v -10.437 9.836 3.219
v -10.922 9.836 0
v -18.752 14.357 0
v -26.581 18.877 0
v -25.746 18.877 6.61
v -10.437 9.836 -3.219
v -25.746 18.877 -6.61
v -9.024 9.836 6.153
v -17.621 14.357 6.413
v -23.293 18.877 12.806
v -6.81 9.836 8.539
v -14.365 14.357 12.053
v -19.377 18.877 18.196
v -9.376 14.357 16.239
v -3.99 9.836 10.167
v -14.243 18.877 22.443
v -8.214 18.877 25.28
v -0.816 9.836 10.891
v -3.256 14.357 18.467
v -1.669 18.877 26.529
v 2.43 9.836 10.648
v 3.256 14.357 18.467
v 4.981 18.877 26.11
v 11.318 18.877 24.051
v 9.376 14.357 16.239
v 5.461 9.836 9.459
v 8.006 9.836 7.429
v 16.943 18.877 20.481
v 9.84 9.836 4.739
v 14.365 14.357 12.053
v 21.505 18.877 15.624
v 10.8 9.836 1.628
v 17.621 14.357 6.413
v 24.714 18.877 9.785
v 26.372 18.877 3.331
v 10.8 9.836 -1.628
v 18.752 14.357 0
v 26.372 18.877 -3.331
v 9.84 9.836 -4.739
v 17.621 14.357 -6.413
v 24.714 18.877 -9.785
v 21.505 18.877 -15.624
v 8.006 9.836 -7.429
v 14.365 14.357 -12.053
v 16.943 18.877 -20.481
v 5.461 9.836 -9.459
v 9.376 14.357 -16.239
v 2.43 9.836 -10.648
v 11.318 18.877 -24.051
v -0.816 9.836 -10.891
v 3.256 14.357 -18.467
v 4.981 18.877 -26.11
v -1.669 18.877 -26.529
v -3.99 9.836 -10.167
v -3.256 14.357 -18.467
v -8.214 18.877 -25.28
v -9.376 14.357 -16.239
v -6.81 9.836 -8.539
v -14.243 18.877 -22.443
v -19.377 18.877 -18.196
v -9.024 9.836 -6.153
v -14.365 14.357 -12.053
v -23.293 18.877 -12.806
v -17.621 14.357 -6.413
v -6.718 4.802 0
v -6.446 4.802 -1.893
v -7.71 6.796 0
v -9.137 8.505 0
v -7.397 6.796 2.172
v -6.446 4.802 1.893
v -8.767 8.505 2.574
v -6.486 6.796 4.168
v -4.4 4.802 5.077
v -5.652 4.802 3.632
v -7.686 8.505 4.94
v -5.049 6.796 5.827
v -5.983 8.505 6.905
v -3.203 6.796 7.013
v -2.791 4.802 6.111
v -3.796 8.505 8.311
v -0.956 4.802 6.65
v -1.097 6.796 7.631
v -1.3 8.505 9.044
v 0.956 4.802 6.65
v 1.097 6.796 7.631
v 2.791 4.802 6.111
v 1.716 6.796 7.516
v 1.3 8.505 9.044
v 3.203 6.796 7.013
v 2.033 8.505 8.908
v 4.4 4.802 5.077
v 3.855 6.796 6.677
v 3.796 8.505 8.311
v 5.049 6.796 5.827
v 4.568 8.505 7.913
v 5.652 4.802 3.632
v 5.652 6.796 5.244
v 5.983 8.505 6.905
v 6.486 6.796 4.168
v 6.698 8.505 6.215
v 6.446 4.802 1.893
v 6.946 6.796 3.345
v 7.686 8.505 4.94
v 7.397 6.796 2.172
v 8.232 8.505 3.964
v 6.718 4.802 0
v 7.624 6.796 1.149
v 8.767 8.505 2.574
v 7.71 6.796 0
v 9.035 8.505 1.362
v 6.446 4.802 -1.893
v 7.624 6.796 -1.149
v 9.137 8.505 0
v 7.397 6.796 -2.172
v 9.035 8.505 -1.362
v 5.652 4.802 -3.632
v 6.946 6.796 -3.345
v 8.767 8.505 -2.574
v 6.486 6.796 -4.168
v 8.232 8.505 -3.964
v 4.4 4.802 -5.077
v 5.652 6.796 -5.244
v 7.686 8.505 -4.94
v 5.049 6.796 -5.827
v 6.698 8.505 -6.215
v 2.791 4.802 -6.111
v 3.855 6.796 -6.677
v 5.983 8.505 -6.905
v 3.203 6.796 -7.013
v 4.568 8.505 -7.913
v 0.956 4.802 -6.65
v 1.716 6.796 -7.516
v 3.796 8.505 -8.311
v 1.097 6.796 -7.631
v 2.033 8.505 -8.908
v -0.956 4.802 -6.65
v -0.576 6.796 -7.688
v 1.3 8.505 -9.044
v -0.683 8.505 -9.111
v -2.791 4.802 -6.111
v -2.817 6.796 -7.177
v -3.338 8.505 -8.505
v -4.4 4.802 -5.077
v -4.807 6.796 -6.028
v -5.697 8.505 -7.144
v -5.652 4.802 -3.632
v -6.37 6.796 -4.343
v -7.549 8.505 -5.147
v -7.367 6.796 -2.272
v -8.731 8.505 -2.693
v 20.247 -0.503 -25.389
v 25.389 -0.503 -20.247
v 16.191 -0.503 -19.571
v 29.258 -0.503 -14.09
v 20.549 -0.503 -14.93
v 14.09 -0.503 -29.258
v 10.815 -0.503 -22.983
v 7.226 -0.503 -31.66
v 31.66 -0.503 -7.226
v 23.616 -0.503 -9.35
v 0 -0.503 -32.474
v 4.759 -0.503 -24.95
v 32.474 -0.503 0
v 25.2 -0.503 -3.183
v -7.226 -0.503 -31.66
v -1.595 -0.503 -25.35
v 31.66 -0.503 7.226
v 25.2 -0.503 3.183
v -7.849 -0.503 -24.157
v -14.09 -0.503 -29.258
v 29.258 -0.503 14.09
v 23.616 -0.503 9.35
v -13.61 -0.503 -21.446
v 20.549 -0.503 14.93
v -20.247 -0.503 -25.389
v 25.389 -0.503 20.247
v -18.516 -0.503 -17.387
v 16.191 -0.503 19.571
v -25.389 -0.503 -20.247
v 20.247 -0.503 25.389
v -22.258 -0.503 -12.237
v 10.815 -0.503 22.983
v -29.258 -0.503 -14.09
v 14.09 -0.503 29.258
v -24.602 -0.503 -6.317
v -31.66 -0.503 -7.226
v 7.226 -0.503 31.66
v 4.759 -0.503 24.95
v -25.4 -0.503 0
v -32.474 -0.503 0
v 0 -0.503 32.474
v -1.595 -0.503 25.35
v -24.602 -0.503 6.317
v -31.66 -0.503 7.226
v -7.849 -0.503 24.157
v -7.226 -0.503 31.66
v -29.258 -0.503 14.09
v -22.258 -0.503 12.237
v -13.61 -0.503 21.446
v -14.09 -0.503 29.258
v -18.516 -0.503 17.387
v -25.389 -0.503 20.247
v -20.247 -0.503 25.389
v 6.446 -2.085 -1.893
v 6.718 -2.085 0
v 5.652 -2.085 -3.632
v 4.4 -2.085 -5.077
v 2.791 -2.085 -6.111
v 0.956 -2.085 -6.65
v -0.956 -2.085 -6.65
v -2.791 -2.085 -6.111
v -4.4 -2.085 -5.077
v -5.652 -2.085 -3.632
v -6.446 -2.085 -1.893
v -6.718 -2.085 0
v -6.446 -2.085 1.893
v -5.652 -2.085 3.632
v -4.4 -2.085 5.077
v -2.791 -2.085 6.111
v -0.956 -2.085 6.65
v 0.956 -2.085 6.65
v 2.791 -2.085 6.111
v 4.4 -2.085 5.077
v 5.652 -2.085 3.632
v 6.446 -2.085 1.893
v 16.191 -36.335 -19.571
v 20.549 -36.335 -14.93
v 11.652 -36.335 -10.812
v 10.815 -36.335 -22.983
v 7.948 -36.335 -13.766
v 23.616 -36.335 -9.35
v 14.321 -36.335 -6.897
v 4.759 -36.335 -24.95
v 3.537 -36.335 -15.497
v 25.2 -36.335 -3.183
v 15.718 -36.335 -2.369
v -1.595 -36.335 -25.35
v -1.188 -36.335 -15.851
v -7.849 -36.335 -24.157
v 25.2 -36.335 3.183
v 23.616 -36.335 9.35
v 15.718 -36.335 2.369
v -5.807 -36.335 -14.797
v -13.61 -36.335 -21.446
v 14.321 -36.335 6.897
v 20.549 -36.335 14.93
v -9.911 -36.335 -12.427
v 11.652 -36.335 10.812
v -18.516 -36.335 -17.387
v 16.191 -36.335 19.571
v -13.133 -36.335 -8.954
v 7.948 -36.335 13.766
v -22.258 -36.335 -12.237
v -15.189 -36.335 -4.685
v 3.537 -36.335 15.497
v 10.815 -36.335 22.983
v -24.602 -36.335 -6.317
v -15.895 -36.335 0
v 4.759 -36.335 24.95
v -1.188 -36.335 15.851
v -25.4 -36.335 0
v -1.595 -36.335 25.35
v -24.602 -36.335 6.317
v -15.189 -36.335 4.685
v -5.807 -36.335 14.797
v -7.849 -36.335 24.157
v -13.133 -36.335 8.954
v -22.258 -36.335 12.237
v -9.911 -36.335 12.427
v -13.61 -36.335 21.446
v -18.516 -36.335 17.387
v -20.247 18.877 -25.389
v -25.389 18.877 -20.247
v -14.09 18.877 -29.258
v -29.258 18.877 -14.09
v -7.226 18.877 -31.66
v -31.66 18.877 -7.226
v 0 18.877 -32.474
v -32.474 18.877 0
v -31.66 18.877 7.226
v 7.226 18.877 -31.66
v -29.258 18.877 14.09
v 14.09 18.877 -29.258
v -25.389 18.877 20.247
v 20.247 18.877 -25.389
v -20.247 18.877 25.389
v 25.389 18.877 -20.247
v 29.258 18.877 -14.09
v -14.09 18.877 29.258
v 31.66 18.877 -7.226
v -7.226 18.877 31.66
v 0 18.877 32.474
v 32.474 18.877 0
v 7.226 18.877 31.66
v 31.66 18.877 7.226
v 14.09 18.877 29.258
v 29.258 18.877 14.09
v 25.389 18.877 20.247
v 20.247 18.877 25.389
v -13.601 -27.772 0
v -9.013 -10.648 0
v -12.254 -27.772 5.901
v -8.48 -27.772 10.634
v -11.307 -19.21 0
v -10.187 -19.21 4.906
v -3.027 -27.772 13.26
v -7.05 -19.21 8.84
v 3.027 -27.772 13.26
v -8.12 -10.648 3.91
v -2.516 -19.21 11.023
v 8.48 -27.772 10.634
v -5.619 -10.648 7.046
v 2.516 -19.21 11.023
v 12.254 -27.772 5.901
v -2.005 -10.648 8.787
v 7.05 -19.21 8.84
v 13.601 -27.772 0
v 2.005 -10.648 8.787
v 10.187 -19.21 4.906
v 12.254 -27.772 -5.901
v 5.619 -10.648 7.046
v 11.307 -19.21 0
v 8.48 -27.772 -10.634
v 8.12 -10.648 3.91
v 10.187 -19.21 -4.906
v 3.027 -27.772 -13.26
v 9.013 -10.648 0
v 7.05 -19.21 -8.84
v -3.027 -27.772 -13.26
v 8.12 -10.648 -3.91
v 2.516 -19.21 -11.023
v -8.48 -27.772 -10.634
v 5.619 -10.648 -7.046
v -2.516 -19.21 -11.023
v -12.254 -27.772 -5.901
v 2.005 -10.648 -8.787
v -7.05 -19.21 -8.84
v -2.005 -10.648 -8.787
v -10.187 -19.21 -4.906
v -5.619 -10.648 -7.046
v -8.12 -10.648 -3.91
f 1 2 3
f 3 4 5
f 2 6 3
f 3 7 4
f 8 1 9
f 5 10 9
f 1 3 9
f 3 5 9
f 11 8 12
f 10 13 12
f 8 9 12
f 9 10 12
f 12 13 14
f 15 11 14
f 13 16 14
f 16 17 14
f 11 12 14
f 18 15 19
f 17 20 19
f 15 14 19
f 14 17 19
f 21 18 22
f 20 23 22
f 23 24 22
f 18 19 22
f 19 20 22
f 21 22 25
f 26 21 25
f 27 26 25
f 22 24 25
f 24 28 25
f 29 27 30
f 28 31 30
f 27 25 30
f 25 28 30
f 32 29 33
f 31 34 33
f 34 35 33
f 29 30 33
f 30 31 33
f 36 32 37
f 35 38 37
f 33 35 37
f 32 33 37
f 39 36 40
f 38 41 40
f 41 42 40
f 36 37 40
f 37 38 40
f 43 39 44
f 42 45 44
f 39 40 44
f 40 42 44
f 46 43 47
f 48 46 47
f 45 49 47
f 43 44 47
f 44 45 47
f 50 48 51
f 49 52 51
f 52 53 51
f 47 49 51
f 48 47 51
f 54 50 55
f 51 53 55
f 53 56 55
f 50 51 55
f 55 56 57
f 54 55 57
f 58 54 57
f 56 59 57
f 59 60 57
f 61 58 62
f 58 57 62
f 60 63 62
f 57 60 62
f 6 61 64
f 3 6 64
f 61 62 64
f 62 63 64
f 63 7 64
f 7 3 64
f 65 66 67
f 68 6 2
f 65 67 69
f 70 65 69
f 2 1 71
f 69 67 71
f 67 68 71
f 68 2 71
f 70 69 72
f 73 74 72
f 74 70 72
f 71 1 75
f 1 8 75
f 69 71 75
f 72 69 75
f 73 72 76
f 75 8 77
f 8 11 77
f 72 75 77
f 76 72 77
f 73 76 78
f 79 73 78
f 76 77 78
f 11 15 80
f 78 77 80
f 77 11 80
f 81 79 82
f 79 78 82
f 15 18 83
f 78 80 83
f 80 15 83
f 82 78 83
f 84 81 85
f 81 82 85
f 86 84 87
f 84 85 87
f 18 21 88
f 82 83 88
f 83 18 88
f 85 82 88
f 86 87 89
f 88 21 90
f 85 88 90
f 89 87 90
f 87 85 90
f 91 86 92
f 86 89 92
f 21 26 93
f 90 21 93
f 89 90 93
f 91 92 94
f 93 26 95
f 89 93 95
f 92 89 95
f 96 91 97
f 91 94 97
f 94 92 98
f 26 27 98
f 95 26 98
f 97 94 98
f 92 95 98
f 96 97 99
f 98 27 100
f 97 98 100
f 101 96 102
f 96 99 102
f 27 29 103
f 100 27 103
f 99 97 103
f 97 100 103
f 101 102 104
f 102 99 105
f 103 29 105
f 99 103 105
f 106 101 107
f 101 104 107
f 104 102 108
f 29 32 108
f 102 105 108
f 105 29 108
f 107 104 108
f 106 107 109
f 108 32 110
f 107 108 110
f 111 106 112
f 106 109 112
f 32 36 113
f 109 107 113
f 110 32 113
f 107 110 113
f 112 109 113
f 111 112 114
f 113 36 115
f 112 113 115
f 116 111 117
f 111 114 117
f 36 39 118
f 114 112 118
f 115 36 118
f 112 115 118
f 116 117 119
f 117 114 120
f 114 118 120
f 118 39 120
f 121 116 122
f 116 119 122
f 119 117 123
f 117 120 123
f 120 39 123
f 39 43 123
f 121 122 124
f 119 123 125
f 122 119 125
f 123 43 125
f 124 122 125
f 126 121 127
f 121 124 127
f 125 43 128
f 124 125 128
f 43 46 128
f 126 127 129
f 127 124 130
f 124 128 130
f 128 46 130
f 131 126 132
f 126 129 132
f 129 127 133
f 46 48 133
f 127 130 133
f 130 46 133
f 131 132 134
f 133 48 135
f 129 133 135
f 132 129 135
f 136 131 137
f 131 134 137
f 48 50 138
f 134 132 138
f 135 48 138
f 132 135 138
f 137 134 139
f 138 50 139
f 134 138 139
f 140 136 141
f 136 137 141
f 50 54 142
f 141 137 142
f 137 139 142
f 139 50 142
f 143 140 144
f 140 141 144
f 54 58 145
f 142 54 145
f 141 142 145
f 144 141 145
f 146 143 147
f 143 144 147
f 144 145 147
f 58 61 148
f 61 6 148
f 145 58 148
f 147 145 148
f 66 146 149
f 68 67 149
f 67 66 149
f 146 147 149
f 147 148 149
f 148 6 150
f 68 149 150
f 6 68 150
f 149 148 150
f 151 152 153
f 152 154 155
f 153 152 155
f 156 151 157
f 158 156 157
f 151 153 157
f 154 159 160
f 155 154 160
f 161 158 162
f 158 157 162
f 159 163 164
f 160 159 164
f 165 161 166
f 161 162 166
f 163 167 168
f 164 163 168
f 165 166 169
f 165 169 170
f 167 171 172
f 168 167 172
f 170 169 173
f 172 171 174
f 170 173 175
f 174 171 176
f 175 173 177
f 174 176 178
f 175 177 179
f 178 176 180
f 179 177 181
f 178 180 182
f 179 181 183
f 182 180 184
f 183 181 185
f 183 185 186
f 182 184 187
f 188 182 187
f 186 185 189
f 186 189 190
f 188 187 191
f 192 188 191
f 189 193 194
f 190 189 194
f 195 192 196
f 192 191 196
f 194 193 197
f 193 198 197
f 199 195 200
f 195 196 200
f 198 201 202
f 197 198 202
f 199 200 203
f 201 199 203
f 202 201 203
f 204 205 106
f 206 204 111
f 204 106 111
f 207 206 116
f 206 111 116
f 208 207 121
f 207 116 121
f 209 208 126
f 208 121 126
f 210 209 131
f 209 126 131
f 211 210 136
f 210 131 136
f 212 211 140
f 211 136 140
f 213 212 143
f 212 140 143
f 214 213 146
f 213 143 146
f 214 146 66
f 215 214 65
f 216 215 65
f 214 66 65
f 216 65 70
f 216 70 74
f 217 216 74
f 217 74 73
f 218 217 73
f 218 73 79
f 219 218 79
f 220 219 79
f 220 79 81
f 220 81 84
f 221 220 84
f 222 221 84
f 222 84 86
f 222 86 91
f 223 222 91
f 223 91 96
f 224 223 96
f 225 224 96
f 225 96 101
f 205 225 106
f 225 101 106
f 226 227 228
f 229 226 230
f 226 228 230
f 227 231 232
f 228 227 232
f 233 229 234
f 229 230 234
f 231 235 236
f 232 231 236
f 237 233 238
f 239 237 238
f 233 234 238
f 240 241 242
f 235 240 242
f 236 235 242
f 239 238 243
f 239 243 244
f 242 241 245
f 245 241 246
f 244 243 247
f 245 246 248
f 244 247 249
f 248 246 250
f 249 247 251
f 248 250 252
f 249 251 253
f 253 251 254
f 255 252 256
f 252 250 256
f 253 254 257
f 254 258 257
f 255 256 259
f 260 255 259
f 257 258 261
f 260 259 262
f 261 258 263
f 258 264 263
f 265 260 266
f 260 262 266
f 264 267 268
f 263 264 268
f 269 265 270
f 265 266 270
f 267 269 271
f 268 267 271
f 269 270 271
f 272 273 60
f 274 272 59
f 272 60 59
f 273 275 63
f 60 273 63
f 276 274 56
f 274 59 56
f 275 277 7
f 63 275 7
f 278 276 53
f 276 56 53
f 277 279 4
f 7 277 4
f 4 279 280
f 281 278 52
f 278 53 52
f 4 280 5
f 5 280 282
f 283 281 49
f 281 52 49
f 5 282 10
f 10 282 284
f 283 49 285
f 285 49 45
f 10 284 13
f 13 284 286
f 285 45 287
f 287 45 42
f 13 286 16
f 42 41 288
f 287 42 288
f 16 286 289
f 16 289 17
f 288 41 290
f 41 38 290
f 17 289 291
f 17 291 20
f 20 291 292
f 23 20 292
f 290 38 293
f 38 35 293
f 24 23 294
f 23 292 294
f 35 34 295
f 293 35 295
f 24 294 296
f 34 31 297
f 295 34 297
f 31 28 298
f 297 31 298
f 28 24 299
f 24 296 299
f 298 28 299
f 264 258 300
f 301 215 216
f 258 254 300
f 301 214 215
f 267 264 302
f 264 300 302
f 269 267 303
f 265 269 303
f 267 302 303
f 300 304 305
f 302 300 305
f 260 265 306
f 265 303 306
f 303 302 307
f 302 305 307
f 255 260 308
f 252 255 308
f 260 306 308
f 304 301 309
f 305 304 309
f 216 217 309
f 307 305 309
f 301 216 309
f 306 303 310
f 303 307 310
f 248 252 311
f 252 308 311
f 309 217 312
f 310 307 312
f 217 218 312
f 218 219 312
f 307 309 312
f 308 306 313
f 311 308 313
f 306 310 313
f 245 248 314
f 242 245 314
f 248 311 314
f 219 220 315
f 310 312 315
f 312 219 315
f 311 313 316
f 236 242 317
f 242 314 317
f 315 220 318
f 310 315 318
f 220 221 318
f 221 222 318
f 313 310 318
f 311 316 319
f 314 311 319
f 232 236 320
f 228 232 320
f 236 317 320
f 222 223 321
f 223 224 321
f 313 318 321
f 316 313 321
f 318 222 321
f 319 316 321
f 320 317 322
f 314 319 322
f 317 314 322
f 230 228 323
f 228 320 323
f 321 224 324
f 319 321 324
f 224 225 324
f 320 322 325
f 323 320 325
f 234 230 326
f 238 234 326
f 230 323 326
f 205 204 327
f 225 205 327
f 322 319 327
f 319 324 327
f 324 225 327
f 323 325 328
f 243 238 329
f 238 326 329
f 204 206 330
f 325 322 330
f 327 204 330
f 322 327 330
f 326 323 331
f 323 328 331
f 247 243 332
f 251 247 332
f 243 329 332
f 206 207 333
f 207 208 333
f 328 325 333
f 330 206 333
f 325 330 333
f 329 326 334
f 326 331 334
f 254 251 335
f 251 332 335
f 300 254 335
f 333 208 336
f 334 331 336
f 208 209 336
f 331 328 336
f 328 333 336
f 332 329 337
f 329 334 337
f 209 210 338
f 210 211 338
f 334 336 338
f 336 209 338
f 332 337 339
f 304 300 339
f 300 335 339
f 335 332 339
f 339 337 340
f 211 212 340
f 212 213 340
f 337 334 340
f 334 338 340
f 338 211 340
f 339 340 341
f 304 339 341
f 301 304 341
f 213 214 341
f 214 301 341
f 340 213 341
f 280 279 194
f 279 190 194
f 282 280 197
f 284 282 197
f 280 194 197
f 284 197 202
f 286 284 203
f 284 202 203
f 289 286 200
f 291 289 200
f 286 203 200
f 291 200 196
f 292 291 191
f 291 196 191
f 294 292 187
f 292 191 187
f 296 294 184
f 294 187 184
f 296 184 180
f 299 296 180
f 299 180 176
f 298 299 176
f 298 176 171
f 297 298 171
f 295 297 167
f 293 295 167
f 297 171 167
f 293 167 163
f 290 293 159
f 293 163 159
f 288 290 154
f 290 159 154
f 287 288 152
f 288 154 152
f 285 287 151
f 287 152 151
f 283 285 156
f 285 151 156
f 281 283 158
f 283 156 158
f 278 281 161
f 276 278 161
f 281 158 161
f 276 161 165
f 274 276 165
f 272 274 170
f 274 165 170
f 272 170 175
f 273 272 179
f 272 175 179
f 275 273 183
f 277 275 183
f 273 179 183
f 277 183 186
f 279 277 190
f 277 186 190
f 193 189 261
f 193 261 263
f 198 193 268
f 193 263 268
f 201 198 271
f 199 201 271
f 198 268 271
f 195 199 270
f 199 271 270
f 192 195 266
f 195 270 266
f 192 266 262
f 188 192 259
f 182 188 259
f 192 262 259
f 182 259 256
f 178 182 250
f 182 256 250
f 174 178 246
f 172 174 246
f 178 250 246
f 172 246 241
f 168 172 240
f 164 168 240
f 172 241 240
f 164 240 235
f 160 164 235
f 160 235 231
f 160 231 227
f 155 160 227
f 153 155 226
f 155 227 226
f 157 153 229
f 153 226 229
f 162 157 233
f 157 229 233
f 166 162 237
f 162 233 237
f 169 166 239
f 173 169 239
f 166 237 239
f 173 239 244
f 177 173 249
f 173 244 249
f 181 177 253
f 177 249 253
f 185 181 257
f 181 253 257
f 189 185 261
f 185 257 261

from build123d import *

# Parameters (mm, degrees)
SKETCH2_R          = 6.7183
CUT_EXTRUDE1_DEPTH = 56.211877571


with BuildPart() as part:
    # Sketch1 → Revolve1 (revolve)
    with BuildSketch(Plane.XY):
        with BuildLine():
            Line((-6.1595, 0), (-6.1595, 1.5875))
            ThreePointArc((-6.1595, 1.5875), (-7.435608029, 6.35), (-10.922, 9.836391971))
            Line((-10.922, 9.836391971), (-26.5811, 18.877177571))
            Line((-26.5811, 18.877177571), (-32.4739, 18.877177571))
            Line((-32.4739, 18.877177571), (-32.4739, -0.503022429))
            Line((-32.4739, -0.503022429), (-25.4, -0.503022429))
            Line((-25.4, -0.503022429), (-25.4, -36.3347))
            Line((-25.4, -36.3347), (-15.895353522, -36.3347))
            Line((-15.895353522, -36.3347), (-6.1595, 0))
        make_face()
    revolve(axis=Axis((0, 0, 0), (0, 1, 0)))

    # Sketch2 → Cut-Extrude1 (cut, through all)
    with BuildSketch(Plane(origin=(0, 18.877177571, 0), x_dir=(1, 0, 0), z_dir=(0, 1, 0))):
        Circle(SKETCH2_R)
    extrude(amount=-CUT_EXTRUDE1_DEPTH, mode=Mode.SUBTRACT)


solid = part.part
